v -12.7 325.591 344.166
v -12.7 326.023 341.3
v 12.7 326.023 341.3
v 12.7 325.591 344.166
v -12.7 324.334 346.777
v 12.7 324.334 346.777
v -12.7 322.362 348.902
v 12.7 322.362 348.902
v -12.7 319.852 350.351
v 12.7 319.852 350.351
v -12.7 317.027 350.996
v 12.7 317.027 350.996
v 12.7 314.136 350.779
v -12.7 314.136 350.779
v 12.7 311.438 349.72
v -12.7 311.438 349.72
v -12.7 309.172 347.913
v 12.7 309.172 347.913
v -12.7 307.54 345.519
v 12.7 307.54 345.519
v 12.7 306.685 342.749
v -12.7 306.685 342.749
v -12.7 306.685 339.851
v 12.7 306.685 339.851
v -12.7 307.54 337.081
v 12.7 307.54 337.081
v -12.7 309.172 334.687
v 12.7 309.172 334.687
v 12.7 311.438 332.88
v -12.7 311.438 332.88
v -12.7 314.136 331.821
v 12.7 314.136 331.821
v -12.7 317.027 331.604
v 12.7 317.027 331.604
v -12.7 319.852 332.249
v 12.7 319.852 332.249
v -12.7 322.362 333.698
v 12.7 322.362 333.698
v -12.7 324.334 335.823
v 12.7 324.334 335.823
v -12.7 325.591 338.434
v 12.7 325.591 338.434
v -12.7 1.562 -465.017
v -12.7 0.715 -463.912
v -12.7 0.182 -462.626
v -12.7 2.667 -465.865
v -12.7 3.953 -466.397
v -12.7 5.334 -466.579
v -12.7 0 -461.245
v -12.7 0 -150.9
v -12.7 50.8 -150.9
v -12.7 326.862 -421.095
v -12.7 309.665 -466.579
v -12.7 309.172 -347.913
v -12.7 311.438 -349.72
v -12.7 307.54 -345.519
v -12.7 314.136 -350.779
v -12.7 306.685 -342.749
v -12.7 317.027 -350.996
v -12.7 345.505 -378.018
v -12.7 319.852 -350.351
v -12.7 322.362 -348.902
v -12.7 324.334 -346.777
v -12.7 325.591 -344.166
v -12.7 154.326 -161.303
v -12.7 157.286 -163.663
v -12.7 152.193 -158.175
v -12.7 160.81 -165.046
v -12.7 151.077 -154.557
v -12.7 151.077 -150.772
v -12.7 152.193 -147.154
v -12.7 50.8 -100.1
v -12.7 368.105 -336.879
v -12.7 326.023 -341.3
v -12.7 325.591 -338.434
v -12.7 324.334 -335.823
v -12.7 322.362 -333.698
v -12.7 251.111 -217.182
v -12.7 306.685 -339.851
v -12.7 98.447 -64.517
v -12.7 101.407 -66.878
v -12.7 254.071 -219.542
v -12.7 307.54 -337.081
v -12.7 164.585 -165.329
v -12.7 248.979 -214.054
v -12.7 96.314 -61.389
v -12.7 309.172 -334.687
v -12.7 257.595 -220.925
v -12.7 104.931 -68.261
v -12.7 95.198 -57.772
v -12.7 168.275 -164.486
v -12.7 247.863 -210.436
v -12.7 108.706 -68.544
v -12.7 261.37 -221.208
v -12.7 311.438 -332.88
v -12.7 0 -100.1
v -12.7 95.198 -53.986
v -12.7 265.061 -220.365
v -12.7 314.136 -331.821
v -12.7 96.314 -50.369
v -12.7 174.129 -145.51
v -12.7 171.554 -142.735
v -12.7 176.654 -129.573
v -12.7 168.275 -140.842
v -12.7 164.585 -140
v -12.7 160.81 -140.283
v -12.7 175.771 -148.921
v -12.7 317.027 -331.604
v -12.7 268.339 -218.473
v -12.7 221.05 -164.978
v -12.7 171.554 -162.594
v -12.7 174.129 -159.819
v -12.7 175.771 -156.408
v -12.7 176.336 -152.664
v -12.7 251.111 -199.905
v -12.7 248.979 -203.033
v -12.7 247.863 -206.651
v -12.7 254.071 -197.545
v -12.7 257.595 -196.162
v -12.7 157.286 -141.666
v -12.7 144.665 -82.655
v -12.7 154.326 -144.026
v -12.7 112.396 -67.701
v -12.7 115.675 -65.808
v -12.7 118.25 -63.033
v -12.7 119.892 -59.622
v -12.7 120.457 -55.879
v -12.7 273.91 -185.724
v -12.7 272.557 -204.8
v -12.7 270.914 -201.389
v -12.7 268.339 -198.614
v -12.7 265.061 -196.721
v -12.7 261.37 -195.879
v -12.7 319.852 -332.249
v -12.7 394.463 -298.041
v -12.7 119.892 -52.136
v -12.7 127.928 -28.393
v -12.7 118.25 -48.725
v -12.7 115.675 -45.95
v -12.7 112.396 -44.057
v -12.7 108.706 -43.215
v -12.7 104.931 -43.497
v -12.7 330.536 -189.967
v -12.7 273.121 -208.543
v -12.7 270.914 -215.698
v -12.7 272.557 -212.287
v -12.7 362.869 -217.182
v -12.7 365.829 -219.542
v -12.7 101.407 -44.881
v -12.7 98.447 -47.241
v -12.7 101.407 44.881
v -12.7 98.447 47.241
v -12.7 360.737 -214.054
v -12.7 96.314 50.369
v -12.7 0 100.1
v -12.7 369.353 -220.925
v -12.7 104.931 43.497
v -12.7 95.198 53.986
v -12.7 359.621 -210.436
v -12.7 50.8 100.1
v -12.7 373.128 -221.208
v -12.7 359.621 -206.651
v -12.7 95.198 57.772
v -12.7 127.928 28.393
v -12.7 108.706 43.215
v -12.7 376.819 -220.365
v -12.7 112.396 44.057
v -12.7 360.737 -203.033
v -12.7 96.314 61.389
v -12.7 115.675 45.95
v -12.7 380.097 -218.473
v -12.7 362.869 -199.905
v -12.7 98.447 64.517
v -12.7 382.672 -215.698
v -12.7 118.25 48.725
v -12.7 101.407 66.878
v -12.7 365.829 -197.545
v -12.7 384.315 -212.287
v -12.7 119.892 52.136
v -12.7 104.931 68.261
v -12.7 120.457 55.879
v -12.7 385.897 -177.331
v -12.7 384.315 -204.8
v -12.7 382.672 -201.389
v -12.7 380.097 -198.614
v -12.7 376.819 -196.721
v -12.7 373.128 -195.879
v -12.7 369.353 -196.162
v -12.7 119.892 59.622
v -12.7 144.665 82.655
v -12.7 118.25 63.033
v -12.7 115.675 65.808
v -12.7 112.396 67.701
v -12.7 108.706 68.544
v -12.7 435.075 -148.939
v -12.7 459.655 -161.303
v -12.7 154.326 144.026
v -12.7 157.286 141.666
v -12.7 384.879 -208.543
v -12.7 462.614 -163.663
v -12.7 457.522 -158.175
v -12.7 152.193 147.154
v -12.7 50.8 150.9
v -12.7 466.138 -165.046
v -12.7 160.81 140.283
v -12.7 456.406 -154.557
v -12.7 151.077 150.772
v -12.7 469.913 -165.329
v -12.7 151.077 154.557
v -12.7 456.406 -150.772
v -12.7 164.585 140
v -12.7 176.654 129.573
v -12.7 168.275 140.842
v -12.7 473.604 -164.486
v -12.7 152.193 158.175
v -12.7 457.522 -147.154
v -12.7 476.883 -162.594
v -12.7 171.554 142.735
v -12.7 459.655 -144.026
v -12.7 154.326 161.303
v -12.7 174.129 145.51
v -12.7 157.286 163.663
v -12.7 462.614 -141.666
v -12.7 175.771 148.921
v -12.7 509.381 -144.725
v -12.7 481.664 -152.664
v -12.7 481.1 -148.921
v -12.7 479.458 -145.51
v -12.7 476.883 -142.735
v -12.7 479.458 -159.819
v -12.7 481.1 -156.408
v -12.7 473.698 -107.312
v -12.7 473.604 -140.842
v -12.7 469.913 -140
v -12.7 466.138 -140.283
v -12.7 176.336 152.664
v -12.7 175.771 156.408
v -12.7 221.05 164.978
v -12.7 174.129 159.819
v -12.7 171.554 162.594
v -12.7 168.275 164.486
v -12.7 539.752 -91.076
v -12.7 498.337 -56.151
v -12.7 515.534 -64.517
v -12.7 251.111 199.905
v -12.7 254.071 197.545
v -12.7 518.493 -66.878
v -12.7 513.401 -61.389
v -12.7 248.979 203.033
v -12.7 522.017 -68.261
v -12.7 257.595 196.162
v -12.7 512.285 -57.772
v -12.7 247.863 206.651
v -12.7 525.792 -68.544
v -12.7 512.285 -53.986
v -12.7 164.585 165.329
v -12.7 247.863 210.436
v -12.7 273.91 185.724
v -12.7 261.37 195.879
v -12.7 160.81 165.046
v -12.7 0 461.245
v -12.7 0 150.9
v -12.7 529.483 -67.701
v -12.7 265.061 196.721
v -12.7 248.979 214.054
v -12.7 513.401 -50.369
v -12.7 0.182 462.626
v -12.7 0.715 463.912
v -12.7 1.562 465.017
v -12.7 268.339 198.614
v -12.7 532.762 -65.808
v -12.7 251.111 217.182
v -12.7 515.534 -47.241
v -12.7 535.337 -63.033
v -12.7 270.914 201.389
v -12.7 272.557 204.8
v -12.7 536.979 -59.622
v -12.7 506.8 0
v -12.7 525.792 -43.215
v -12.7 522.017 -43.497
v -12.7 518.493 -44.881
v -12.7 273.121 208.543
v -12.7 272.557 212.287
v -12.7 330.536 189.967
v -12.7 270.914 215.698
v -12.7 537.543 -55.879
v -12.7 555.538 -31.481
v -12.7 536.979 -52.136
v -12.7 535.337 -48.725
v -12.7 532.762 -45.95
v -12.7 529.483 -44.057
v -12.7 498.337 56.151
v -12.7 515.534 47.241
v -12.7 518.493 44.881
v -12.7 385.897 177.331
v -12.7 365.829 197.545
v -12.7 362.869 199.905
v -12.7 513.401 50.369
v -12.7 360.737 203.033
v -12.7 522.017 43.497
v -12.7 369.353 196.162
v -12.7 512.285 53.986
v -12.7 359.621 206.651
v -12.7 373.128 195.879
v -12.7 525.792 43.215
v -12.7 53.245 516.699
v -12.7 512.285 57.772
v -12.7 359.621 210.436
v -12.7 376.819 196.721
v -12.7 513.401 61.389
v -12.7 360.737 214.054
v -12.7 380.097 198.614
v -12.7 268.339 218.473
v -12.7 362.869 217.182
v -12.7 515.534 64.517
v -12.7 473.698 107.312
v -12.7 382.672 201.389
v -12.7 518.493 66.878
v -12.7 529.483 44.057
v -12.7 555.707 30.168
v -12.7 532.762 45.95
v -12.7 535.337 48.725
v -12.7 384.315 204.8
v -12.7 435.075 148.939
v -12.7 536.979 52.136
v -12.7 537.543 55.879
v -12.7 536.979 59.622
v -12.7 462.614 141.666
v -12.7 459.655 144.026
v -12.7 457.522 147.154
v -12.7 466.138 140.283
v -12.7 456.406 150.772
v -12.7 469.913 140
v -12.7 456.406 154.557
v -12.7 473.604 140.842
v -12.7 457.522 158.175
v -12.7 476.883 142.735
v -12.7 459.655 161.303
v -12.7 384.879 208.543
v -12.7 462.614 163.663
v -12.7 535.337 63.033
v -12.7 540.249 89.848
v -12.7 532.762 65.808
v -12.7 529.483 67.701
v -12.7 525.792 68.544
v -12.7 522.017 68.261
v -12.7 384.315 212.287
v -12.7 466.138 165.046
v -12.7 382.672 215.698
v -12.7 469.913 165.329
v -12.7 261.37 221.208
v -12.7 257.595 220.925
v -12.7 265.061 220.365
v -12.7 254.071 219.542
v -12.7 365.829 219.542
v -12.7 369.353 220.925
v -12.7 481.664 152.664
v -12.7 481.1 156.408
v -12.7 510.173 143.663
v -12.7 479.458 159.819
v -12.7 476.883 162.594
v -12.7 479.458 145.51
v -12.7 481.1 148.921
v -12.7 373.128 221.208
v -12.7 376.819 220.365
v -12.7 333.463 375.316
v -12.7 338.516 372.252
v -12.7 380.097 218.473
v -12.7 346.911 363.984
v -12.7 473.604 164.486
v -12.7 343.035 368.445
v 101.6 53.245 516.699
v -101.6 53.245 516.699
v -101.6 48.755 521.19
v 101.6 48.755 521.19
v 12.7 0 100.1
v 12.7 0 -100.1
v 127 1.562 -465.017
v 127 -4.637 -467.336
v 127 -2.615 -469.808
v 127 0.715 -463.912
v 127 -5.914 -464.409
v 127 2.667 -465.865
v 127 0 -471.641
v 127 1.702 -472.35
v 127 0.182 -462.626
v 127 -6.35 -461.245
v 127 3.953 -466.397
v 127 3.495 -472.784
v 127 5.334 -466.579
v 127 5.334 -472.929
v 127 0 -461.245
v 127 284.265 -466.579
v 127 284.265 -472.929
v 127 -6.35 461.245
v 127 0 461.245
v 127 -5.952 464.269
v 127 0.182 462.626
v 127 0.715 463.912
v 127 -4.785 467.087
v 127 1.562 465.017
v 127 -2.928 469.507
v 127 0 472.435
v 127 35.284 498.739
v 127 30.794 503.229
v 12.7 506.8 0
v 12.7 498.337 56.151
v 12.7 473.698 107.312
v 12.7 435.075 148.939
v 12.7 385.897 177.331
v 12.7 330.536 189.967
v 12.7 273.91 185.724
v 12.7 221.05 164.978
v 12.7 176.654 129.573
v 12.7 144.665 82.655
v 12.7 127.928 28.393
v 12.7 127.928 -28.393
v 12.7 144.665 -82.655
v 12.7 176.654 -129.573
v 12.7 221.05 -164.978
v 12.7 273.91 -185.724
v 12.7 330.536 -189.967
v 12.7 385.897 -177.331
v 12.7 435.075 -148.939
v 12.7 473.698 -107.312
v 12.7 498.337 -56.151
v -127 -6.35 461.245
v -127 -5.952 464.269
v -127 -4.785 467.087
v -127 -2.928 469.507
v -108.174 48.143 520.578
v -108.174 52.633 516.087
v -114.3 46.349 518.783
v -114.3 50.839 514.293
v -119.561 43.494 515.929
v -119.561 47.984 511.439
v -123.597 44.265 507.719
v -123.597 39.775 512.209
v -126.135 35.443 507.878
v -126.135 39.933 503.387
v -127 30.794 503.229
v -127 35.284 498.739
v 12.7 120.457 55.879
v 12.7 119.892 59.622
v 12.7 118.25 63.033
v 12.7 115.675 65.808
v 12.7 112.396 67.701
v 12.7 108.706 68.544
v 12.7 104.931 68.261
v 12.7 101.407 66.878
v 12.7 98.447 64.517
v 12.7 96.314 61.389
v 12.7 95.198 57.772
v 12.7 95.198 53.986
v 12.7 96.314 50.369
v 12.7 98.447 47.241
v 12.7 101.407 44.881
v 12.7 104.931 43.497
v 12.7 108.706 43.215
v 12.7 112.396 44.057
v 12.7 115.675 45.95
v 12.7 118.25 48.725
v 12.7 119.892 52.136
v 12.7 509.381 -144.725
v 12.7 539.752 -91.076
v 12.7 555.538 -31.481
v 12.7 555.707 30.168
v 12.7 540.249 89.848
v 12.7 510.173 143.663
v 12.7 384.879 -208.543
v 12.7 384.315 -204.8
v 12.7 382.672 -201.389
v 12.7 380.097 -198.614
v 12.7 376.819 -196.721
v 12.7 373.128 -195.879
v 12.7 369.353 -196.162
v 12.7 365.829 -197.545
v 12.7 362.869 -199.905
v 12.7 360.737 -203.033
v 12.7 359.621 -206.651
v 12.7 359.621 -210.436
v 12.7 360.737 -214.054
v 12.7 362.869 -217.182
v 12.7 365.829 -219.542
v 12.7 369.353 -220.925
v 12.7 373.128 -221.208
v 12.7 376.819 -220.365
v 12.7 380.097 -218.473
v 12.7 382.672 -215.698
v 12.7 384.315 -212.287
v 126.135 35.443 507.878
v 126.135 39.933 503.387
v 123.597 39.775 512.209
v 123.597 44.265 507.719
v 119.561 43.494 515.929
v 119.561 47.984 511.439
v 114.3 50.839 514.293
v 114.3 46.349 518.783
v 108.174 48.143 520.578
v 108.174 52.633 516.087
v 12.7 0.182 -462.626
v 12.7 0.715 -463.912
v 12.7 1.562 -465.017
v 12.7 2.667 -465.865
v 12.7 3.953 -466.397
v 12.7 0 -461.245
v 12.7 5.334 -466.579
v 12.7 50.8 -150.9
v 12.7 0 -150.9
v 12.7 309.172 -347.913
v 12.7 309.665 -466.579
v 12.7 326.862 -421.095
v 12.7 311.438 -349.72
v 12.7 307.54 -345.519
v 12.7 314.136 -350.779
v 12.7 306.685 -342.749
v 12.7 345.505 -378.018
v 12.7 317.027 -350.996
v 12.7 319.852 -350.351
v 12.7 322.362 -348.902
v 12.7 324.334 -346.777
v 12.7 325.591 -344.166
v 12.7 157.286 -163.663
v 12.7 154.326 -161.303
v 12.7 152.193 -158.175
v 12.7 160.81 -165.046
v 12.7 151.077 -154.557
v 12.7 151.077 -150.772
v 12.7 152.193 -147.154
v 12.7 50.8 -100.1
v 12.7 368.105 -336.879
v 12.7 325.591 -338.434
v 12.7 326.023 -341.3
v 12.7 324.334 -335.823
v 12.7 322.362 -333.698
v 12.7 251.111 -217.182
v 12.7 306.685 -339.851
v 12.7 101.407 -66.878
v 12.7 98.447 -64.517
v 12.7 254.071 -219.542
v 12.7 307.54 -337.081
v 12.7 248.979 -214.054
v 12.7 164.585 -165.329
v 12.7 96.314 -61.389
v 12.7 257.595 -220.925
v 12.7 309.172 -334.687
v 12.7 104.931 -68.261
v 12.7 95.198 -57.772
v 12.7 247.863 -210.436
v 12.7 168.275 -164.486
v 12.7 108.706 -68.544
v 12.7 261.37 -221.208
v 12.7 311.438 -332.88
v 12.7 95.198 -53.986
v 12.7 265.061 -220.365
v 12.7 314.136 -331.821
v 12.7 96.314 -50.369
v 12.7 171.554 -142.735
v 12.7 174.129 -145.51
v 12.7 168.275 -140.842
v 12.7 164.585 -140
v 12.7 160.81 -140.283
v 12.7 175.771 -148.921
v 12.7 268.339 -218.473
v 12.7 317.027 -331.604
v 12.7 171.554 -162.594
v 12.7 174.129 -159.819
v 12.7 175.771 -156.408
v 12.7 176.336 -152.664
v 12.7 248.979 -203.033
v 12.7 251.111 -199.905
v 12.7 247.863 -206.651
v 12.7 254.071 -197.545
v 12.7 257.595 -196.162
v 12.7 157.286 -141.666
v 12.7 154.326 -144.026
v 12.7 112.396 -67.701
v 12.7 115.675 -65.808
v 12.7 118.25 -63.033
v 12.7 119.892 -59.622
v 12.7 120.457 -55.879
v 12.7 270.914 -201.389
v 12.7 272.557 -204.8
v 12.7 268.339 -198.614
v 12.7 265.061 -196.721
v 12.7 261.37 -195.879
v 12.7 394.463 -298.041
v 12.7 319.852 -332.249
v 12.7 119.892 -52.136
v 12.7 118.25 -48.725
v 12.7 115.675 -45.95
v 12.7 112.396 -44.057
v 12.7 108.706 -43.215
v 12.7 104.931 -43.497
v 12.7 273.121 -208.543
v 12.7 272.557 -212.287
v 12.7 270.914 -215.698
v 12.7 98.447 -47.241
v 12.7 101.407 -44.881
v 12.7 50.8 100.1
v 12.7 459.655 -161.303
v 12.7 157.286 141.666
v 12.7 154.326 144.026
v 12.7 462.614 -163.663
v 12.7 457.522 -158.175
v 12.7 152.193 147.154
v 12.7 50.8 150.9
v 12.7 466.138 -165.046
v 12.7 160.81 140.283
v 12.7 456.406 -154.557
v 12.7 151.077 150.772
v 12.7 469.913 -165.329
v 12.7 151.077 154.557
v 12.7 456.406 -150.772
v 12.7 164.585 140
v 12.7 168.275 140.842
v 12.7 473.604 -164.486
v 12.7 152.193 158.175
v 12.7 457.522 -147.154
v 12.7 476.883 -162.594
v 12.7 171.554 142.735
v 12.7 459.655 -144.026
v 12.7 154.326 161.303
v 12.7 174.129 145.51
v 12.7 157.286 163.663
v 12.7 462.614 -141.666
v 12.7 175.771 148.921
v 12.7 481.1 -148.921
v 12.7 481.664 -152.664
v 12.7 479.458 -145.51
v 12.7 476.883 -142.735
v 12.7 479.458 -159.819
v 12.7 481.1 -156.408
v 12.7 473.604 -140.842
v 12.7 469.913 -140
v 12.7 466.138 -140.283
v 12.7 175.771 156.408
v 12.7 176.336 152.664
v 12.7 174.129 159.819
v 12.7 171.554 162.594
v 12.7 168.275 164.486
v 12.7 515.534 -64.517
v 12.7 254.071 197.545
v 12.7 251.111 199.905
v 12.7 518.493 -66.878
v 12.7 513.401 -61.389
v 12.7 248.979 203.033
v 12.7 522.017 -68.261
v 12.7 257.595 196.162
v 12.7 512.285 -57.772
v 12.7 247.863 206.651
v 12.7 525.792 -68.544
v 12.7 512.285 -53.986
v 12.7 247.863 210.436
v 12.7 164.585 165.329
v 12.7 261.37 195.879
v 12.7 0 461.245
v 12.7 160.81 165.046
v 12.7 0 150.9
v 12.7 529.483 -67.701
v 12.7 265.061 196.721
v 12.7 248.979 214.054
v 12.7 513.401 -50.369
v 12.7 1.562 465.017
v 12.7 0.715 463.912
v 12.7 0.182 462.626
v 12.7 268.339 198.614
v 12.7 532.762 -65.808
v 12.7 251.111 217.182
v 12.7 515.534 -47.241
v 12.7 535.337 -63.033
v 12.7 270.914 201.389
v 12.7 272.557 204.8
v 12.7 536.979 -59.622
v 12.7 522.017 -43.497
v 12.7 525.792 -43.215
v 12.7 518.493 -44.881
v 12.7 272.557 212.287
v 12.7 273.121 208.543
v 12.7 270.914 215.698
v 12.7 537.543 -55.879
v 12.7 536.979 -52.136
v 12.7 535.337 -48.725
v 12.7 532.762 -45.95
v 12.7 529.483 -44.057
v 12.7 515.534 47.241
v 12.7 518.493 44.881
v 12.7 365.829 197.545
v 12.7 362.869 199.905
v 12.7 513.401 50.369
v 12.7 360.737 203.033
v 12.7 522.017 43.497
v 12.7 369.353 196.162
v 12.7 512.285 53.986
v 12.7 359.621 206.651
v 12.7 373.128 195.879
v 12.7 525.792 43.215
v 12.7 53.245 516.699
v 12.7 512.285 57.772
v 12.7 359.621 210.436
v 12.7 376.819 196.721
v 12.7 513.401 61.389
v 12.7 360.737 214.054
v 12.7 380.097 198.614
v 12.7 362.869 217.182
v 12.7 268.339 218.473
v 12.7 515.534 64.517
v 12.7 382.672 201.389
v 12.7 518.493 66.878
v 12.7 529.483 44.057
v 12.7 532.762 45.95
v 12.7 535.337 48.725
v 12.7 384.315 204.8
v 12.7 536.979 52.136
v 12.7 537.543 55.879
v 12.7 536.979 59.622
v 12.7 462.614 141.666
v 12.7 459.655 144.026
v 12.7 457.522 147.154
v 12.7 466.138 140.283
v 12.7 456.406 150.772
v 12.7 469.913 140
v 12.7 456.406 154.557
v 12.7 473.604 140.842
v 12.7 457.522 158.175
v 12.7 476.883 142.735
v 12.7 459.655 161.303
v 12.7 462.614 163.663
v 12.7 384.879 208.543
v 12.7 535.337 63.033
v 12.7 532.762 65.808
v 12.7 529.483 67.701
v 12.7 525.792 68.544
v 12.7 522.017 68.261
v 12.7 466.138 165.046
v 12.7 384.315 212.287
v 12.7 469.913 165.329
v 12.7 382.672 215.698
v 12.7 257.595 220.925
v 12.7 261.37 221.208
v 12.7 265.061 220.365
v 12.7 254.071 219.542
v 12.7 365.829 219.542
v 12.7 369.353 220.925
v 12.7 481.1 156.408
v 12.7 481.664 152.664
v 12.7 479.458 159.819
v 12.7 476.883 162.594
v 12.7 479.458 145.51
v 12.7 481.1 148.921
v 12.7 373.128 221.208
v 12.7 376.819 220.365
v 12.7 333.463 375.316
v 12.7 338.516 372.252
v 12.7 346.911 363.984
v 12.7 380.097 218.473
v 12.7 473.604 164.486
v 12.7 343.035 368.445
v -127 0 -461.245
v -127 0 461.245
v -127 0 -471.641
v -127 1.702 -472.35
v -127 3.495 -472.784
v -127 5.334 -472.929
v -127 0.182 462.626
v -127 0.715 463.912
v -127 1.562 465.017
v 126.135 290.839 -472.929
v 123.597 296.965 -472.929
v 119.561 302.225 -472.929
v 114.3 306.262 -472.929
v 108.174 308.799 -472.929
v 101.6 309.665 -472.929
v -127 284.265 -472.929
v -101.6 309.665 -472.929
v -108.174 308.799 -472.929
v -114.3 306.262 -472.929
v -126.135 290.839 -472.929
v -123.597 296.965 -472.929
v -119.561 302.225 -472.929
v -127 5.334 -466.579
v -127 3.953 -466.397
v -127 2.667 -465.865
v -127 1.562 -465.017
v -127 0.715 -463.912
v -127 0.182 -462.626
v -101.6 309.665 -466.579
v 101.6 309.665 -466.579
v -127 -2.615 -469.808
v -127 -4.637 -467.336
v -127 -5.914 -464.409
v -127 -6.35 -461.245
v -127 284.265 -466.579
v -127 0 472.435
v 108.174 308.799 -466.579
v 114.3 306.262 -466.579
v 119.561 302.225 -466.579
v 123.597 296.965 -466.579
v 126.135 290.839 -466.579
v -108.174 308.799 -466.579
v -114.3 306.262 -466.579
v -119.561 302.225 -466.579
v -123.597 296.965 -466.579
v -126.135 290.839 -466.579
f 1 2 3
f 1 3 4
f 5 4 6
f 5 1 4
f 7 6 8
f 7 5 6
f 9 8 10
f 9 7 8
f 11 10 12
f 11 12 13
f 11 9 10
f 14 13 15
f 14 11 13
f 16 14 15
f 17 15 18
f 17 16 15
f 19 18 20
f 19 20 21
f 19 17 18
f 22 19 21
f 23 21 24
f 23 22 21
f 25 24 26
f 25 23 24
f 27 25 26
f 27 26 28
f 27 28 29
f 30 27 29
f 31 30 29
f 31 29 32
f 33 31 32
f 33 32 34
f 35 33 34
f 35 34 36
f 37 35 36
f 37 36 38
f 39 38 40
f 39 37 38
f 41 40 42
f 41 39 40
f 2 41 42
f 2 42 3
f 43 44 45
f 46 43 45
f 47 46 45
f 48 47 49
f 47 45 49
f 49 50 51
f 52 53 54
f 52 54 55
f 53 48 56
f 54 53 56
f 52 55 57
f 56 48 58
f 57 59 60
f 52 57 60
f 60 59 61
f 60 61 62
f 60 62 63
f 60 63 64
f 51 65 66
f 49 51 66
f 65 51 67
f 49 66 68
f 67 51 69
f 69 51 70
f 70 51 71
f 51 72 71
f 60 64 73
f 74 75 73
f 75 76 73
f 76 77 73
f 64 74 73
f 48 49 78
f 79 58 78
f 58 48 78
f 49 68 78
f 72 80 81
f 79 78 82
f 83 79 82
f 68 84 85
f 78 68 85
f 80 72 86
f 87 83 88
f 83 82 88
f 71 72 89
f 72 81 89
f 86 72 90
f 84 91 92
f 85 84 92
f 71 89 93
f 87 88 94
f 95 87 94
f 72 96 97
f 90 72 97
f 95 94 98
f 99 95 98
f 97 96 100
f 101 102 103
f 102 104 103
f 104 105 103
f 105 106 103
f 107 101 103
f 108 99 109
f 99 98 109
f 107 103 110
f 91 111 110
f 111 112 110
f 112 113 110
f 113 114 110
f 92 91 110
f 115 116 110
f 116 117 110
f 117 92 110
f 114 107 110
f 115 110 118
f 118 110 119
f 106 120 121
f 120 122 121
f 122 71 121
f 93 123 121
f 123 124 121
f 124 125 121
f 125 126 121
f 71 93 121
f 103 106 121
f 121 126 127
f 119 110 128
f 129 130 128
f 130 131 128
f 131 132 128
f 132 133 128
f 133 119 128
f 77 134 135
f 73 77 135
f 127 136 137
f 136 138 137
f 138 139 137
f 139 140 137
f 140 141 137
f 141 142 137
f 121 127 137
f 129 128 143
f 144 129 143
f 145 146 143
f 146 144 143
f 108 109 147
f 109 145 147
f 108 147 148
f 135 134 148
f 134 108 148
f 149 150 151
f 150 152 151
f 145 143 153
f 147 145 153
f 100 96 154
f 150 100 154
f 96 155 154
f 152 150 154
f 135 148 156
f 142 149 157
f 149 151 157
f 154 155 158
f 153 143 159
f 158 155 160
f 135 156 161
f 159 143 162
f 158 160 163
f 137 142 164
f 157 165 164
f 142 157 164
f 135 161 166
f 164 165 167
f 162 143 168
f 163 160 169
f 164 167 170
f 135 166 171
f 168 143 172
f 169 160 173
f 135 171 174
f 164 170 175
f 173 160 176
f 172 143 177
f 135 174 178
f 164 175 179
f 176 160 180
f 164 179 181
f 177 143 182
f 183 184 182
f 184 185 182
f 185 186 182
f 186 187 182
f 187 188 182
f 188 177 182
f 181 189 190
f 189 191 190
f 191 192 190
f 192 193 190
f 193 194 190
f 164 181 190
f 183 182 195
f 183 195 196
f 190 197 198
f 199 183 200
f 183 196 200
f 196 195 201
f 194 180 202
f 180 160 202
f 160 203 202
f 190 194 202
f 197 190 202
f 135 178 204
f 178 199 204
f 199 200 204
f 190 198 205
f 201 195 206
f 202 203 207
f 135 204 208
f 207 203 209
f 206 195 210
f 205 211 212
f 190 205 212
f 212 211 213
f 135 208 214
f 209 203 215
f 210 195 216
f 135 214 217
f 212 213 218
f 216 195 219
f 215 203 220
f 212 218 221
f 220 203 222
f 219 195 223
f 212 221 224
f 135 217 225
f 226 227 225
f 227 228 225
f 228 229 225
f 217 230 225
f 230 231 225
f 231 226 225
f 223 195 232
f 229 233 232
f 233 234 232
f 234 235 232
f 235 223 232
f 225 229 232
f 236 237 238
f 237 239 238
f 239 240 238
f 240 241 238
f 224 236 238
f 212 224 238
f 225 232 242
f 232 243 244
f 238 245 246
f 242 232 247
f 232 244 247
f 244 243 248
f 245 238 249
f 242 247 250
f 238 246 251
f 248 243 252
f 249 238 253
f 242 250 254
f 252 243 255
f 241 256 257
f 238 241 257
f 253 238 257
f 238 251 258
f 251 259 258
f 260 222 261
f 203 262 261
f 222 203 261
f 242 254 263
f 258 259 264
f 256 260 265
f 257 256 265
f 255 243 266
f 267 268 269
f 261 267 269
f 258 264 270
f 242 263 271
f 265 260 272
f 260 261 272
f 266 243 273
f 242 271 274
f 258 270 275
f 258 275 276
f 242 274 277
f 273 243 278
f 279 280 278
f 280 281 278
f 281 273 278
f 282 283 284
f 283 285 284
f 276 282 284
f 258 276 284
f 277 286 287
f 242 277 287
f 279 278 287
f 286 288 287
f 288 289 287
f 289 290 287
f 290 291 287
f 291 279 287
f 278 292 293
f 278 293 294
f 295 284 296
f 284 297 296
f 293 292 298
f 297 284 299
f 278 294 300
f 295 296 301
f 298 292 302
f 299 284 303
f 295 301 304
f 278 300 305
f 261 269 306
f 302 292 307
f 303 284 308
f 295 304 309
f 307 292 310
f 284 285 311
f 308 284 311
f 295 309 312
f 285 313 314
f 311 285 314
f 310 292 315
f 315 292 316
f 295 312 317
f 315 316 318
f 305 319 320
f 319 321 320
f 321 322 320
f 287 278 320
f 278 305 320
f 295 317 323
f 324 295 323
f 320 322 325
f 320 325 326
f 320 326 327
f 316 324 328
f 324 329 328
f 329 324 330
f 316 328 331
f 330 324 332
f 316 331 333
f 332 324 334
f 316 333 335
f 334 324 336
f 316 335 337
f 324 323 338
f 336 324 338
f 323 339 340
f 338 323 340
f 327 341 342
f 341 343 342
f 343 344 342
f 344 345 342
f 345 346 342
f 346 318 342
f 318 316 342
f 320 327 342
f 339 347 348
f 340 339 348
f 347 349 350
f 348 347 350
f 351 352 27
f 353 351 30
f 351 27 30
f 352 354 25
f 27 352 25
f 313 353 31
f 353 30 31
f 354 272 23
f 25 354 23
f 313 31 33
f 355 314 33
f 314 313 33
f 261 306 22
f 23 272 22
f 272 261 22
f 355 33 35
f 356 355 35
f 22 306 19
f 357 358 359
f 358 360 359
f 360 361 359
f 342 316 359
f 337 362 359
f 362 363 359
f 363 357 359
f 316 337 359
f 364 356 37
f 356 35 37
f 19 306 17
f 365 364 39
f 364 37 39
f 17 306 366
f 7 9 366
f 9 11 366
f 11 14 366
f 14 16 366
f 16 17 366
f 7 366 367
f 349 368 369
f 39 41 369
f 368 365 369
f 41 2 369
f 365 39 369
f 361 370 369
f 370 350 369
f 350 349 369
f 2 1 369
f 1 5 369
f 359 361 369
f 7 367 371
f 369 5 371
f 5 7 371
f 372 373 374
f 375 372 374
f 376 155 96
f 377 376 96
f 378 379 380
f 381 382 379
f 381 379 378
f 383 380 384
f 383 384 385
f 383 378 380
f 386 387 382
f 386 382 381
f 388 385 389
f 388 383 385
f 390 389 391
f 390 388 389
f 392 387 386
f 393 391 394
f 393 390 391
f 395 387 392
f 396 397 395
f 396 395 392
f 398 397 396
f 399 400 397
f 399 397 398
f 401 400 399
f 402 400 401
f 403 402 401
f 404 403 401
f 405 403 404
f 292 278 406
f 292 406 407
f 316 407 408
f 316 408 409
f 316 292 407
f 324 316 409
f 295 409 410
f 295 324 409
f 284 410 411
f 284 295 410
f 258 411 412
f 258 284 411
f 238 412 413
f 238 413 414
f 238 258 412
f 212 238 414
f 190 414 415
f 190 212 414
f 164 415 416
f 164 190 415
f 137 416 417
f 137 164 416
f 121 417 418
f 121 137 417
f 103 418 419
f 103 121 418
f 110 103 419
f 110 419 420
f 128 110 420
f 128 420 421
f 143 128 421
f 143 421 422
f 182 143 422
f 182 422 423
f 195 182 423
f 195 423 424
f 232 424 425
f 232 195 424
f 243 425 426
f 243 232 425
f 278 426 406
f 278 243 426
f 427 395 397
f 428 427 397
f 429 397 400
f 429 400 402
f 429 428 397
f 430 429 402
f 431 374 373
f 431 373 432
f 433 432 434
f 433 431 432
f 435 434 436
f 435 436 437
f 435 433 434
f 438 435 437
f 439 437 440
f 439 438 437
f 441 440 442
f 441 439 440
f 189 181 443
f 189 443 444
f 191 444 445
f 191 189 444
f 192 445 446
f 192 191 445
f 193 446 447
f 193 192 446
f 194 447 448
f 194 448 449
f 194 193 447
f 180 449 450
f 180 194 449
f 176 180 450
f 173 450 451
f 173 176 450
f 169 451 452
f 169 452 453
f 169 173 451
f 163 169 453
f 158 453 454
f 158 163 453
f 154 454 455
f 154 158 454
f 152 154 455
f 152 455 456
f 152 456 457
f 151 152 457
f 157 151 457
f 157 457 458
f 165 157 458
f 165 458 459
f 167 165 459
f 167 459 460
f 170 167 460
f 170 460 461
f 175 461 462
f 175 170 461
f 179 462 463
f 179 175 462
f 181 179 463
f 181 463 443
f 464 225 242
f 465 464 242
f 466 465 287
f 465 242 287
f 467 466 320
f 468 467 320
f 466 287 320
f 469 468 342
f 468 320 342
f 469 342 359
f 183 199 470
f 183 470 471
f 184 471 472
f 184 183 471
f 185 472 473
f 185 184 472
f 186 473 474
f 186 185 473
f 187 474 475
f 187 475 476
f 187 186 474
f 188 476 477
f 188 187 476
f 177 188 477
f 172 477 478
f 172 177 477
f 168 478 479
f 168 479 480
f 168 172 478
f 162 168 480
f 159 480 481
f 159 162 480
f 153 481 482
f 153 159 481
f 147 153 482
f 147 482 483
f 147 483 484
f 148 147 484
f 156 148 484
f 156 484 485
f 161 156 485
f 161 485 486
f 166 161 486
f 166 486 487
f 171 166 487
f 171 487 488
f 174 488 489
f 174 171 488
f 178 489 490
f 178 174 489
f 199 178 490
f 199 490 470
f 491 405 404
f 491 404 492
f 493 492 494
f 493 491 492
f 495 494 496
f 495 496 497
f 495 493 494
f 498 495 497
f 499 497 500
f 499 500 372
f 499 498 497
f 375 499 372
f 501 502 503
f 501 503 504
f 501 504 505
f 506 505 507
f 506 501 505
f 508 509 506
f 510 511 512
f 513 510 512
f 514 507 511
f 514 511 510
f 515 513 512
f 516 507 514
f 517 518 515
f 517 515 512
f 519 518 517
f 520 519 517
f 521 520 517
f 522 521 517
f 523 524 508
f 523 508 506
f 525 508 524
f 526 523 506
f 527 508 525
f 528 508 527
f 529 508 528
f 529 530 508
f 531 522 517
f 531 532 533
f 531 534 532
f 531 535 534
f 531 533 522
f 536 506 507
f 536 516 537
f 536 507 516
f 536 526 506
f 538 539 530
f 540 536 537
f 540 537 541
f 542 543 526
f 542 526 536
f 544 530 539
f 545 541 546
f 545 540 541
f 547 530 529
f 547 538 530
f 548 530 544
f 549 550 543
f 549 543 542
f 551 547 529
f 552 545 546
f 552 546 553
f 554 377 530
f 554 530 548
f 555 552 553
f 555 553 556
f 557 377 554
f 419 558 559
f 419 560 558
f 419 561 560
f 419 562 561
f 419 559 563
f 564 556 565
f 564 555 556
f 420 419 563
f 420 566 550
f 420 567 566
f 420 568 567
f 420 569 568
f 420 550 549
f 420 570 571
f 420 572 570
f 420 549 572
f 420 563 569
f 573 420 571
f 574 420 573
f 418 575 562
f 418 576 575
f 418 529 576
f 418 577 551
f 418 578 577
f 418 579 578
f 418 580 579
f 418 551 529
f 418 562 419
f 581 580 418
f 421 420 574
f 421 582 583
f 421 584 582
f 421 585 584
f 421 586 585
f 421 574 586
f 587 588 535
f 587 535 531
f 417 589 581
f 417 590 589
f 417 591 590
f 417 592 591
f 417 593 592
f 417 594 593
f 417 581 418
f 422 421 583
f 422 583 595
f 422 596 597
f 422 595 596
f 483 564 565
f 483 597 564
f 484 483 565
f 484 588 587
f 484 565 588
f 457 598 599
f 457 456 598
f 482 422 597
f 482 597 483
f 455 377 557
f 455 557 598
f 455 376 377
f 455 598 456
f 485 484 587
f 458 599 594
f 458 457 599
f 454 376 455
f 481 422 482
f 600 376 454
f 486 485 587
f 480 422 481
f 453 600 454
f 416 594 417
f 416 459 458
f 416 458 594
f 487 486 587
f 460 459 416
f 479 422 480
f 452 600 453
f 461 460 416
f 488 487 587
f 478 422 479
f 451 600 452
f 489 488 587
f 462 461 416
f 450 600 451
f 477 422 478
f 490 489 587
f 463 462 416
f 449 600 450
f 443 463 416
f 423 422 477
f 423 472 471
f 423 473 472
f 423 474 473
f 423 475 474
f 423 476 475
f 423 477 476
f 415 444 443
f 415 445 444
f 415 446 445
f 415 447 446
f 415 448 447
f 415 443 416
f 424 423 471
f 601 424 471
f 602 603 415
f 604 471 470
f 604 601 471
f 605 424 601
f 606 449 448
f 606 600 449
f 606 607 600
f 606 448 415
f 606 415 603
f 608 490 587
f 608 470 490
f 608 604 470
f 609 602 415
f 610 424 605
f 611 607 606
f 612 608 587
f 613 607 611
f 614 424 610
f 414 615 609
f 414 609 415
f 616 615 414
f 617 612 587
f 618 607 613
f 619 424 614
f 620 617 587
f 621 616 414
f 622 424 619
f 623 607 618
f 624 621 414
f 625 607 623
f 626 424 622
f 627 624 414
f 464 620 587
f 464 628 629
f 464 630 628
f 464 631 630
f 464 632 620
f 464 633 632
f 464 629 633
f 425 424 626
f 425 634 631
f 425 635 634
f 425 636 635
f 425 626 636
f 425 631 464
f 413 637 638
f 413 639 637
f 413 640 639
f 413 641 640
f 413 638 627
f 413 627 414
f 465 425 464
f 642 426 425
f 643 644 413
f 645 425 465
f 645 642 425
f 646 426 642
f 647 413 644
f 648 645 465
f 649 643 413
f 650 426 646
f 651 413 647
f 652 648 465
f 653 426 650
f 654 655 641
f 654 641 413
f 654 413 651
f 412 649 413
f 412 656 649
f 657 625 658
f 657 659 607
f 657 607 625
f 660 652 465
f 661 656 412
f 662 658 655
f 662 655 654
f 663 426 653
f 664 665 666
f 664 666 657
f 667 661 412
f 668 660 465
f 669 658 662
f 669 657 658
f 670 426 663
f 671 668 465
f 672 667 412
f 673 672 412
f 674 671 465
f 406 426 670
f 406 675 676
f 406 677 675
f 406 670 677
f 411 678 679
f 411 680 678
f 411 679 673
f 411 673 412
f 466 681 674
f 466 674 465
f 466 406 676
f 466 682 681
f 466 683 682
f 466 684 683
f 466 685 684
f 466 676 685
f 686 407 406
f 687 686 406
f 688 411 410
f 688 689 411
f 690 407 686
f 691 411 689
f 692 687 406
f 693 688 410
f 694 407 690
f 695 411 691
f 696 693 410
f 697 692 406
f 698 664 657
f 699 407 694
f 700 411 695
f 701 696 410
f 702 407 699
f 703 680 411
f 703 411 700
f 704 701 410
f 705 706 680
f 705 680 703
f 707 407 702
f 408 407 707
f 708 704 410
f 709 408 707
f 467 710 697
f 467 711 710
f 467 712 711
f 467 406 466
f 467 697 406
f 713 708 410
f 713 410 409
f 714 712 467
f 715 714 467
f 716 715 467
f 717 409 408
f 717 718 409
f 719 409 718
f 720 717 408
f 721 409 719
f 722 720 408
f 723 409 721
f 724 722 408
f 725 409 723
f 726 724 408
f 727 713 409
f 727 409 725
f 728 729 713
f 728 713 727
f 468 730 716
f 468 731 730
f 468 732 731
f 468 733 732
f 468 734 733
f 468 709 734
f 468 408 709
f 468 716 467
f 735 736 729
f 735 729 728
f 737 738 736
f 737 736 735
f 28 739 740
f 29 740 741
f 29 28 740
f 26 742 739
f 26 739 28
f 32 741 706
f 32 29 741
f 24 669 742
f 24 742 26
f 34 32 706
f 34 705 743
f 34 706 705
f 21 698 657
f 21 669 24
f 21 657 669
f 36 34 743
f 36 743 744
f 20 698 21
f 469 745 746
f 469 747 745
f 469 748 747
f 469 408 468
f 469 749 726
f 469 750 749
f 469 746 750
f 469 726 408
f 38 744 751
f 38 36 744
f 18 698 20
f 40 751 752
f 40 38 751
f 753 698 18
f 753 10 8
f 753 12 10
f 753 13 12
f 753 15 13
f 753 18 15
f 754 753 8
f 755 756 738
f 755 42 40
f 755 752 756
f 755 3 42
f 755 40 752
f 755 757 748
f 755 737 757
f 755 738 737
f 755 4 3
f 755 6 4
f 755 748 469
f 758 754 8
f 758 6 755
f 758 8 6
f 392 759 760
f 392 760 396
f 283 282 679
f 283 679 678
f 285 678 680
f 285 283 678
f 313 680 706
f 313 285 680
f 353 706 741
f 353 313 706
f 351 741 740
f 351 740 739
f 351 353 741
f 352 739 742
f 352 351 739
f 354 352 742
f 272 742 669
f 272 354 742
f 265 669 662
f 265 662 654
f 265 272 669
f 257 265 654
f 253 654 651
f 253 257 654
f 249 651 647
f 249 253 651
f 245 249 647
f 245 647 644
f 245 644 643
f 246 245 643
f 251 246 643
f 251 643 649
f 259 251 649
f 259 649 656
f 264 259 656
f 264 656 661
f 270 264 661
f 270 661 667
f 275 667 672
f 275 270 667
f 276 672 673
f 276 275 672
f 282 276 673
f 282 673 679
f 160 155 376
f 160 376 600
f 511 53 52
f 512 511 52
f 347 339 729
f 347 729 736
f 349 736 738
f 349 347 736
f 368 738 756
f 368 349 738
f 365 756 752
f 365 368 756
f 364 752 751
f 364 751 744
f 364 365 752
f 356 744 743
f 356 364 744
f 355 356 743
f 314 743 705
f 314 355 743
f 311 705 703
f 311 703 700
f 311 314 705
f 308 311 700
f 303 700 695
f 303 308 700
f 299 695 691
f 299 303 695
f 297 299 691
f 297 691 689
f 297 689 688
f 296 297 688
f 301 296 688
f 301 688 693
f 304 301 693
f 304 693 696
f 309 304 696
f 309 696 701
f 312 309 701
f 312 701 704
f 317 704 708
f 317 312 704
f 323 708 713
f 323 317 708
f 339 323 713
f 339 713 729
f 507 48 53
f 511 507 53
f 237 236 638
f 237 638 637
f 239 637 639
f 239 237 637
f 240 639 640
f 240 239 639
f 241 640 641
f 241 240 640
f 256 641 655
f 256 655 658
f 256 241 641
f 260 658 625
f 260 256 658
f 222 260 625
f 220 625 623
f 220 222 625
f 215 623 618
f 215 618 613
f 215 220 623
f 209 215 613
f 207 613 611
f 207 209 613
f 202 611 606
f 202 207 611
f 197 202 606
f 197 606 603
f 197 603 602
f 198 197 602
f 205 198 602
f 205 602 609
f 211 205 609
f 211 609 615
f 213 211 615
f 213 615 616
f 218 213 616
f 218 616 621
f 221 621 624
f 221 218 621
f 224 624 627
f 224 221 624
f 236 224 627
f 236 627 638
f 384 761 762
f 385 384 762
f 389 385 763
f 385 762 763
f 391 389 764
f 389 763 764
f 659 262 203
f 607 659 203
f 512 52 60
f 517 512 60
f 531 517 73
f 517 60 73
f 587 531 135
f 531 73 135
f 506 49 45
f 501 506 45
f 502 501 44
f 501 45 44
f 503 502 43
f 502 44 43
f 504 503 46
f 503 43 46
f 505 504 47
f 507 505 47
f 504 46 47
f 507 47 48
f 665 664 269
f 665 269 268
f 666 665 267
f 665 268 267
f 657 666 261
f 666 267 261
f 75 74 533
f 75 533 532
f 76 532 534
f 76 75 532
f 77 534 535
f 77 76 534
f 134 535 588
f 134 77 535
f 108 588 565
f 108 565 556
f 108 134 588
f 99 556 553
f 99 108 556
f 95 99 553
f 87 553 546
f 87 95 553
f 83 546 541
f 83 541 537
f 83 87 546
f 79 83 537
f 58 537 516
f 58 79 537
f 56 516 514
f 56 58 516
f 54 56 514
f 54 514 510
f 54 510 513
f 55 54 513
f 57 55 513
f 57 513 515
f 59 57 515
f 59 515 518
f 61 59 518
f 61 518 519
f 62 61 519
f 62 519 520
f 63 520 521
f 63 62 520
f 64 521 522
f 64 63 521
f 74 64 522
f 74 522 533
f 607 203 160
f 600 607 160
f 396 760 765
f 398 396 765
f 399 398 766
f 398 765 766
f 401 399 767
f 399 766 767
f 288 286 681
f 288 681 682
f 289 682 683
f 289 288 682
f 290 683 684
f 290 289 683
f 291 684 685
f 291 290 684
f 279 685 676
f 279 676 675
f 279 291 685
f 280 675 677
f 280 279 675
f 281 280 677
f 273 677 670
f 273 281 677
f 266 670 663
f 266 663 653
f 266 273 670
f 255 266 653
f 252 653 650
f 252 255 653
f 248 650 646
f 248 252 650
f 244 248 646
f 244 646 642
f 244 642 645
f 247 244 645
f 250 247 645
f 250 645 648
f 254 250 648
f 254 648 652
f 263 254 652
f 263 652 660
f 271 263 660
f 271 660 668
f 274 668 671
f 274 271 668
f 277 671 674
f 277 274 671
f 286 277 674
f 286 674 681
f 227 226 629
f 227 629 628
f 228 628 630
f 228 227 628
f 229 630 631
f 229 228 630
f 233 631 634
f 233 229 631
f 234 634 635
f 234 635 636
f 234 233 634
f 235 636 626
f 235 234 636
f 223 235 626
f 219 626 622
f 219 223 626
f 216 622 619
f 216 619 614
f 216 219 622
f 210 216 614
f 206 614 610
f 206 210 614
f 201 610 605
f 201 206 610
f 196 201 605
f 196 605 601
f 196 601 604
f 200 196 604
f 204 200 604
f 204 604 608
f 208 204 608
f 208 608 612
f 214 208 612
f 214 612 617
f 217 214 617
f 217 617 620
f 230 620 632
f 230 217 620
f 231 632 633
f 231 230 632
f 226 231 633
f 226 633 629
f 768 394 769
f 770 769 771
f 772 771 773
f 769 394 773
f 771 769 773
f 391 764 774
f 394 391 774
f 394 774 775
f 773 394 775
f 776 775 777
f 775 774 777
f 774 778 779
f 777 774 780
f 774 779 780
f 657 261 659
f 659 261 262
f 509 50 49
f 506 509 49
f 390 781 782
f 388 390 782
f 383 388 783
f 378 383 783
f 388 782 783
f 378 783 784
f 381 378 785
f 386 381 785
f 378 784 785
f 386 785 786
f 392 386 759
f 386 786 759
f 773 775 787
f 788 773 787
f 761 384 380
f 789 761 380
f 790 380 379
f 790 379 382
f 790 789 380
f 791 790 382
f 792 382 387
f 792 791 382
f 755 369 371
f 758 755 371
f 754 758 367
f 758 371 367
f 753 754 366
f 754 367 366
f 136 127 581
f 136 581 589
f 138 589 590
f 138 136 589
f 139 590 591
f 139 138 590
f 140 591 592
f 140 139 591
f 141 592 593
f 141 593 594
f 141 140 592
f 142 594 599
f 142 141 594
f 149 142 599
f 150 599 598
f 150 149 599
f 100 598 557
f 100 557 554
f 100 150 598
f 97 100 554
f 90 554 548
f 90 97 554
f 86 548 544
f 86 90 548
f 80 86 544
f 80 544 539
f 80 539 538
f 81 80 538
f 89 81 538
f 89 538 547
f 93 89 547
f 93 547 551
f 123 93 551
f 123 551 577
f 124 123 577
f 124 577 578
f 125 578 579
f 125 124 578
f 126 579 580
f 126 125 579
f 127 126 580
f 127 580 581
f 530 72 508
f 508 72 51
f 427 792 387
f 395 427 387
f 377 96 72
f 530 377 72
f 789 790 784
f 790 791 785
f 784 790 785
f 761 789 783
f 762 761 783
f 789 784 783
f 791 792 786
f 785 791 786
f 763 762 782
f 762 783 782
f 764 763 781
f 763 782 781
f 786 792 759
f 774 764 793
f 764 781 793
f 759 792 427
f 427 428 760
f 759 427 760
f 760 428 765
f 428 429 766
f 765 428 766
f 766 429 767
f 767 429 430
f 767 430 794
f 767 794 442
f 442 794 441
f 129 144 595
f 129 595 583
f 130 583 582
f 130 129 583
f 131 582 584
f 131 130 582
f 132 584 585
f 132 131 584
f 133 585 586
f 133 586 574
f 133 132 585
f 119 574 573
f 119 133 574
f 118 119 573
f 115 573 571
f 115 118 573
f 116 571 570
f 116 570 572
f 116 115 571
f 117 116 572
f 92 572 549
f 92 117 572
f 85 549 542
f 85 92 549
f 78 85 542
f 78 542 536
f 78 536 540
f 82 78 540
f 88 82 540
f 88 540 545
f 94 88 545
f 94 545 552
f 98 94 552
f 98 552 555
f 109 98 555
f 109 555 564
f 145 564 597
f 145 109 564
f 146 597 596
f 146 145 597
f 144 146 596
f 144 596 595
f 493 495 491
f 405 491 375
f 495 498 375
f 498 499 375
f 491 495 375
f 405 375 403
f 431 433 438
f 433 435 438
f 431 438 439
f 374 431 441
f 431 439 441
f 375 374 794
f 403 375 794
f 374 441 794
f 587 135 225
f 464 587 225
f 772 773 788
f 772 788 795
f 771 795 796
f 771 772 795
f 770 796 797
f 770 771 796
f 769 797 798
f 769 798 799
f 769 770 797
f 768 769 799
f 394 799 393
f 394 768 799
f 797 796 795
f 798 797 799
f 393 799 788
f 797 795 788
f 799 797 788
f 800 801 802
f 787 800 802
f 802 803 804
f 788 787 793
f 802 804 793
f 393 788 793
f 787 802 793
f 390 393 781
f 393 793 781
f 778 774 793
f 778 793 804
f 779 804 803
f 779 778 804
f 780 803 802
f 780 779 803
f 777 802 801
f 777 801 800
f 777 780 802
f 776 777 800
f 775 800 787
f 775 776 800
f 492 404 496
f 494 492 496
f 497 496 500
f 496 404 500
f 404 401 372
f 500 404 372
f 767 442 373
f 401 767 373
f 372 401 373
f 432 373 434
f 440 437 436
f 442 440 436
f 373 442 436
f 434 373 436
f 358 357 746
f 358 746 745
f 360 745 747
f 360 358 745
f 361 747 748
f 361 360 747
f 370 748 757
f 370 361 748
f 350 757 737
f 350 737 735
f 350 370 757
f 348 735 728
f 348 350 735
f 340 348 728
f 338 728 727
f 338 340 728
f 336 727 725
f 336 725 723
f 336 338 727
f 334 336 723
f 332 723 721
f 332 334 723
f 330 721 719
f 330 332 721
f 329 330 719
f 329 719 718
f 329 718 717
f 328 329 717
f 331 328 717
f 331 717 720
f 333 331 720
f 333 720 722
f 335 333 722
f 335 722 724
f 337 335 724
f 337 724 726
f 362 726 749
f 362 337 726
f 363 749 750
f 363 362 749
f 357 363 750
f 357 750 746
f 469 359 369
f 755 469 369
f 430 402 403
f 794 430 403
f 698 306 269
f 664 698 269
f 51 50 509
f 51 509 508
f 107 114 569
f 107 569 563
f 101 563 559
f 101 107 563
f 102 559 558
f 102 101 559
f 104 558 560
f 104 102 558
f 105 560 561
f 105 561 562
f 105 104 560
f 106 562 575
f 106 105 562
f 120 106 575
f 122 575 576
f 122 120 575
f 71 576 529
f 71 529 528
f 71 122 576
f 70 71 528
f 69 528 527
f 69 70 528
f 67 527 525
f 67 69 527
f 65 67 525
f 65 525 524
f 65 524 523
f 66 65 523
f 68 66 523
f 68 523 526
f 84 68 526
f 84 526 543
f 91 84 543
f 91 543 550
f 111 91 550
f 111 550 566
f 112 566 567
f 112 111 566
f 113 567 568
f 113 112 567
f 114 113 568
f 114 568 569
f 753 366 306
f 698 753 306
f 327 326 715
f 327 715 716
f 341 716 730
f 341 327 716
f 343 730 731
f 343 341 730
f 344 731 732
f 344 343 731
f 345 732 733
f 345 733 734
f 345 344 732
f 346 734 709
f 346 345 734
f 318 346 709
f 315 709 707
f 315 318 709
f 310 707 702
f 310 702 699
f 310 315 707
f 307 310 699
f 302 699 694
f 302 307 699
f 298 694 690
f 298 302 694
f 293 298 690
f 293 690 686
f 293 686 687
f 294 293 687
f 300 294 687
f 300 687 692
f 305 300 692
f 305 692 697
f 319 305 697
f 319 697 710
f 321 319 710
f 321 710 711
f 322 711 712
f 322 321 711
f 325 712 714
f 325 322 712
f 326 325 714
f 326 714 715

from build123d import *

# Parameters (mm, degrees)
FLANGE_PROFILE_DEPTH                = 12.7
F_7_8_1_DIAMETER_HOLE1_D            = 25.4
BOLT_PATTERN_COUNT                  = 12
SKETCH15_R                          = 9.72312
BOSS_EXTRUDE1_DEPTH                 = 12.7
SKETCH5_W                           = 254
SKETCH5_H                           = 1317.865260112
BASE_SKID_DEPTH                     = 6.35
BEND_START                          = -127
BEND_HEEL_DEPTH                     = 254
BEND_HEEL_2_DEPTH                   = 254
BEND_TOE_DEPTH                      = 254
BEND_TOE_2_DEPTH                    = 254
WEBBING_BODY_DEPTH                  = 12.7
WEBBING_EXTRUDE_DEPTH               = 12.7
SKID_START                          = -472.929130056
SKID_EDGES_DEPTH                    = 6.35
SKID_START_2                        = -334.061851681
SKID_EDGES_2_DEPTH                  = 6.35
FILLET1_R                           = 500
CONVERT_START                       = -12.7
CONVERT_FLANGE_TO_SHEET_OUTLINE_R   = 12.7
CONVERT_FLANGE_TO_SHEET_OUTLINE_R_2 = 9.72312
CONVERT_FLANGE_TO_SHEET_OUTLINE_R_3 = 190.5
CONVERT_FLANGE_TO_SHEET_DEPTH       = 25.4
CUT_EXTRUDE1_DEPTH                  = 774.747599071
CUT_EXTRUDE1_DEPTH_BACK             = 774.747599071
WEBBING_4_W                         = 50.8
WEBBING_4_H                         = 50.8


# Read off the part's stored shape, not the designer's step: Bend Heel, Bend Toe, Skid Edges, Convert Flange to Sheet
# Sheet-metal steps are written as plain solids
with BuildPart() as part:
    # Sketch1 → Flange Profile (new, symmetric)
    with BuildSketch(Plane(origin=(0, 0, 0), x_dir=(0, 0, -1), z_dir=(1, 0, 0))):
        with BuildLine():
            ThreePointArc((-190.5, 316.3), (0, 506.8), (190.5, 316.3))
            Line((190.5, 316.3), (241.3, 316.3))
            ThreePointArc((241.3, 316.3), (0, 557.6), (-241.3, 316.3))
            Line((-241.3, 316.3), (-190.5, 316.3))
        make_face()
        with BuildLine():
            Line((241.3, 316.3), (190.5, 316.3))
            ThreePointArc((190.5, 316.3), (0, 125.8), (-190.5, 316.3))
            Line((-190.5, 316.3), (-241.3, 316.3))
            ThreePointArc((-241.3, 316.3), (0, 75), (241.3, 316.3))
        make_face()
    extrude(amount=FLANGE_PROFILE_DEPTH, both=True)

    # 7/8 (1) Diameter Hole1 (through all)
    with Locations(Plane(origin=(12.7, 260.420968162, -208.543385896), x_dir=(0, 0, 1), z_dir=(1, 0, 0))):
        with Locations((0, 0)):
            f_7_8_1_diameter_hole1 = Hole(F_7_8_1_DIAMETER_HOLE1_D / 2)

    # Bolt Pattern: 7/8 (1) Diameter Hole1 ×12 about axis
    bolt_pattern_axis = Axis((0, 316.3, 0), (1, 0, 0))
    for i in range(1, BOLT_PATTERN_COUNT):
        add(f_7_8_1_diameter_hole1.rotate(bolt_pattern_axis, i * 360 / BOLT_PATTERN_COUNT), mode=Mode.SUBTRACT)

    # Sketch15 → Boss-Extrude1 (add, symmetric)
    with BuildSketch(Plane(origin=(0, 0, 0), x_dir=(0, 0, -1), z_dir=(1, 0, 0))):
        with BuildLine():
            Line((-238.273120599, 278.2), (-341.3, 278.2))
            ThreePointArc((-341.3, 278.2), (-379.4, 316.3), (-341.3, 354.4))
            Line((-341.3, 354.4), (-238.273120599, 354.4))
            ThreePointArc((-238.273120599, 354.4), (-200.173120599, 316.3), (-238.273120599, 278.2))
        make_face()
        with Locations((-341.3, 316.3)):
            Circle(SKETCH15_R, mode=Mode.SUBTRACT)
    boss_extrude1 = extrude(amount=BOSS_EXTRUDE1_DEPTH, both=True)

    # Mirror2: Boss-Extrude1 across plane
    add(boss_extrude1.mirror(Plane.XY))

    # Web Outline → Webbing Body (add, symmetric)
    with BuildSketch(Plane(origin=(0, 0, 0), x_dir=(0, 0, -1), z_dir=(1, 0, 0))):
        with BuildLine():
            Line((-516.69946035, 53.244915153), (-465.016837626, 1.562292429))
            ThreePointArc((-465.016837626, 1.562292429), (-463.286363484, 0.406026574), (-461.245130056, 0))
            Line((-461.245130056, 0), (461.245130056, 0))
            ThreePointArc((461.245130056, 0), (465.016837626, 1.562292429), (466.579130056, 5.334))
            Line((466.579130056, 5.334), (466.579130056, 309.66453199))
            Line((466.579130056, 309.66453199), (354.774573435, 351.937702939))
            ThreePointArc((354.774573435, 351.937702939), (378.779370872, 309.451149073), (341.3, 278.2))
            Line((341.3, 278.2), (238.273120599, 278.2))
            ThreePointArc((238.273120599, 278.2), (0, 75), (-238.273120599, 278.2))
            Line((-238.273120599, 278.2), (-341.3, 278.2))
            ThreePointArc((-341.3, 278.2), (-373.746134391, 296.328561317), (-375.315537192, 333.462553119))
            Line((-375.315537192, 333.462553119), (-516.69946035, 53.244915153))
        make_face()
    extrude(amount=WEBBING_BODY_DEPTH, both=True)

    # webbing → Webbing Extrude (add, symmetric)
    with BuildSketch(Plane(origin=(0, 0, 0), x_dir=(0, 0, -1), z_dir=(1, 0, 0))):
        with BuildLine():
            Line((-341.3, 354.4), (-238.273120599, 354.4))
            ThreePointArc((-238.273120599, 354.4), (-206.240337357, 441.562178038), (-143.662935834, 510.172769794))
            Line((-143.662935834, 510.172769794), (-363.983621447, 346.911489968))
            ThreePointArc((-363.983621447, 346.911489968), (-353.243873581, 352.479467711), (-341.3, 354.4))
        make_face()
        with BuildLine():
            ThreePointArc((144.724902657, 509.381310724), (206.583332152, 440.995697107), (238.273120599, 354.4))
            Line((238.273120599, 354.4), (341.3, 354.4))
            ThreePointArc((341.3, 354.4), (348.148850927, 353.779370872), (354.774573435, 351.937702939))
            Line((354.774573435, 351.937702939), (144.724902657, 509.381310724))
        make_face()
    extrude(amount=WEBBING_EXTRUDE_DEPTH, both=True)

    # Fillet1
    fillet1_edges = [part.edges().sort_by_distance(p)[0] for p in [
        (0, 351.937702939, -354.774573435),
    ]]
    fillet(fillet1_edges, radius=FILLET1_R)


with BuildPart() as body_2:
    # Sketch5 → Base Skid (new body)
    with BuildSketch(Plane(origin=(0, 0, 0), x_dir=(1, 0, 0), z_dir=(0, 1, 0))):
        with Locations((0, 118.6125)):
            Rectangle(SKETCH5_W, SKETCH5_H)
    extrude(amount=-BASE_SKID_DEPTH)

    # Bend Heel outline → Bend Heel (cut)
    with BuildSketch(Plane.YZ.offset(BEND_START)):
        with BuildLine():
            Line((0, -777.545130056), (0, -471.640528076))
            ThreePointArc((0, -471.640528076), (-4.636915504, -467.33583609), (-6.35, -461.245130056))
            Line((-6.35, -461.245130056), (-6.35, -777.545130056))
            Line((-6.35, -777.545130056), (0, -777.545130056))
        make_face()
    extrude(amount=BEND_HEEL_DEPTH, mode=Mode.SUBTRACT)

    # Bend Heel 2 outline → Bend Heel 2 (add)
    with BuildSketch(Plane.YZ.offset(BEND_START)):
        with BuildLine():
            Line((5.334, -472.929130056), (309.66453199, -472.929130056))
            Line((309.66453199, -472.929130056), (309.66453199, -466.579130056))
            Line((309.66453199, -466.579130056), (5.334, -466.579130056))
            ThreePointArc((5.334, -466.579130056), (1.56229243, -465.016837626), (0, -461.245130056))
            Line((0, -461.245130056), (0, -471.640528076))
            ThreePointArc((0, -471.640528076), (2.590277571, -472.602411563), (5.334, -472.929130056))
        make_face()
    extrude(amount=BEND_HEEL_2_DEPTH)

    # Bend Toe outline → Bend Toe (cut)
    with BuildSketch(Plane.YZ.offset(BEND_START)):
        with BuildLine():
            Line((-6.35, 540.320130056), (-6.35, 461.245130056))
            ThreePointArc((-6.35, 461.245130056), (-5.460608458, 465.71640328), (-2.927835631, 469.506965687))
            Line((-2.927835631, 469.506965687), (0, 472.434801318))
            Line((0, 472.434801318), (0, 540.320130056))
            Line((0, 540.320130056), (-6.35, 540.320130056))
        make_face()
    extrude(amount=BEND_TOE_DEPTH, mode=Mode.SUBTRACT)

    # Bend Toe 2 outline → Bend Toe 2 (add)
    with BuildSketch(Plane.YZ.offset(BEND_START)):
        with BuildLine():
            Line((48.754787092, 521.189588411), (0, 472.434801318))
            Line((0, 472.434801318), (0, 461.245130056))
            ThreePointArc((0, 461.245130056), (0.406026574, 463.286363484), (1.562292429, 465.016837626))
            Line((1.562292429, 465.016837626), (53.244915153, 516.69946035))
            Line((53.244915153, 516.69946035), (48.754787092, 521.189588411))
        make_face()
    extrude(amount=BEND_TOE_2_DEPTH)

    # Skid Edges outline → Skid Edges (cut)
    with BuildSketch(Plane.XY.offset(SKID_START)):
        with BuildLine():
            ThreePointArc((-127, 284.26453199), (-119.560512242, 302.225044232), (-101.6, 309.66453199))
            Line((-101.6, 309.66453199), (-127, 309.66453199))
            Line((-127, 309.66453199), (-127, 284.26453199))
        make_face()
        with BuildLine():
            ThreePointArc((101.6, 309.66453199), (119.560512242, 302.225044232), (127, 284.26453199))
            Line((127, 284.26453199), (127, 309.66453199))
            Line((127, 309.66453199), (101.6, 309.66453199))
        make_face()
    extrude(amount=SKID_EDGES_DEPTH, mode=Mode.SUBTRACT)

    # Skid Edges 2 outline → Skid Edges 2 (cut)
    with BuildSketch(Plane(origin=(0, 0, 0), x_dir=(1, 0, 0), z_dir=(0, 0.707106781186546, -0.707106781186549)).offset(SKID_START_2)):
        with BuildLine():
            Line((-127, -403.011532817), (-101.6, -403.011532817))
            ThreePointArc((-101.6, -403.011532817), (-119.560512242, -395.572045059), (-127, -377.611532817))
            Line((-127, -377.611532817), (-127, -403.011532817))
        make_face()
        with BuildLine():
            ThreePointArc((127, -377.611532817), (119.560512242, -395.572045059), (101.6, -403.011532817))
            Line((101.6, -403.011532817), (127, -403.011532817))
            Line((127, -403.011532817), (127, -377.611532817))
        make_face()
    extrude(amount=SKID_EDGES_2_DEPTH, mode=Mode.SUBTRACT)


with BuildPart() as body_3:
    # Convert Flange to Sheet outline → Convert Flange to Sheet (new body)
    with BuildSketch(Plane.YZ.offset(CONVERT_START)):
        with BuildLine():
            ThreePointArc((509.381310724, -144.724902657), (557.599091285, -0.66222749), (510.172769794, 143.662935834))
            Line((510.172769794, 143.662935834), (346.911489968, 363.983621447))
            ThreePointArc((346.911489968, 363.983621447), (340.849804008, 370.436182371), (333.462553119, 375.315537192))
            Line((333.462553119, 375.315537192), (53.244915153, 516.69946035))
            Line((53.244915153, 516.69946035), (1.562292429, 465.016837626))
            ThreePointArc((1.562292429, 465.016837626), (0.406026574, 463.286363484), (0, 461.245130056))
            Line((0, 461.245130056), (0, -461.245130056))
            ThreePointArc((0, -461.245130056), (1.56229243, -465.016837626), (5.334, -466.579130056))
            Line((5.334, -466.579130056), (309.66453199, -466.579130056))
            Line((309.66453199, -466.579130056), (326.862138017, -421.094708764))
            ThreePointArc((326.862138017, -421.094708764), (356.321830687, -357.183029185), (394.462927947, -298.040548863))
            Line((394.462927947, -298.040548863), (509.381310724, -144.724902657))
        make_face()
        with Locations((107.756614104, -55.879031838)):
            Circle(CONVERT_FLANGE_TO_SHEET_OUTLINE_R, mode=Mode.SUBTRACT)
        with Locations((163.635645942, -152.664354058)):
            Circle(CONVERT_FLANGE_TO_SHEET_OUTLINE_R, mode=Mode.SUBTRACT)
        with Locations((260.420968162, -208.543385896)):
            Circle(CONVERT_FLANGE_TO_SHEET_OUTLINE_R, mode=Mode.SUBTRACT)
        with Locations((316.3, -341.3)):
            Circle(CONVERT_FLANGE_TO_SHEET_OUTLINE_R_2, mode=Mode.SUBTRACT)
        with Locations((372.179031838, -208.543385896)):
            Circle(CONVERT_FLANGE_TO_SHEET_OUTLINE_R, mode=Mode.SUBTRACT)
        with Locations((316.3, 0)):
            Circle(CONVERT_FLANGE_TO_SHEET_OUTLINE_R_3, mode=Mode.SUBTRACT)
        with Locations((468.964354058, -152.664354058)):
            Circle(CONVERT_FLANGE_TO_SHEET_OUTLINE_R, mode=Mode.SUBTRACT)
        with Locations((524.843385896, -55.879031838)):
            Circle(CONVERT_FLANGE_TO_SHEET_OUTLINE_R, mode=Mode.SUBTRACT)
        with Locations((107.756614104, 55.879031838)):
            Circle(CONVERT_FLANGE_TO_SHEET_OUTLINE_R, mode=Mode.SUBTRACT)
        with Locations((163.635645942, 152.664354058)):
            Circle(CONVERT_FLANGE_TO_SHEET_OUTLINE_R, mode=Mode.SUBTRACT)
        with Locations((260.420968162, 208.543385896)):
            Circle(CONVERT_FLANGE_TO_SHEET_OUTLINE_R, mode=Mode.SUBTRACT)
        with Locations((372.179031838, 208.543385896)):
            Circle(CONVERT_FLANGE_TO_SHEET_OUTLINE_R, mode=Mode.SUBTRACT)
        with Locations((524.843385896, 55.879031838)):
            Circle(CONVERT_FLANGE_TO_SHEET_OUTLINE_R, mode=Mode.SUBTRACT)
        with Locations((468.964354058, 152.664354058)):
            Circle(CONVERT_FLANGE_TO_SHEET_OUTLINE_R, mode=Mode.SUBTRACT)
        with Locations((316.3, 341.3)):
            Circle(CONVERT_FLANGE_TO_SHEET_OUTLINE_R_2, mode=Mode.SUBTRACT)
    extrude(amount=CONVERT_FLANGE_TO_SHEET_DEPTH)

    # webbing<4> → Cut-Extrude1 (cut, two sides: drawn at the far end of the back side and taken through both)
    with BuildSketch(Plane(origin=(0, 0, 0), x_dir=(0, 0, -1), z_dir=(1, 0, 0)).offset(-CUT_EXTRUDE1_DEPTH_BACK)):
        with Locations((125.5, 25.4)):
            Rectangle(WEBBING_4_W, WEBBING_4_H)
        with Locations((-125.5, 25.4)):
            Rectangle(WEBBING_4_W, WEBBING_4_H)
    extrude(amount=CUT_EXTRUDE1_DEPTH + CUT_EXTRUDE1_DEPTH_BACK, mode=Mode.SUBTRACT)


solid = Compound([body_2.part, body_3.part])
